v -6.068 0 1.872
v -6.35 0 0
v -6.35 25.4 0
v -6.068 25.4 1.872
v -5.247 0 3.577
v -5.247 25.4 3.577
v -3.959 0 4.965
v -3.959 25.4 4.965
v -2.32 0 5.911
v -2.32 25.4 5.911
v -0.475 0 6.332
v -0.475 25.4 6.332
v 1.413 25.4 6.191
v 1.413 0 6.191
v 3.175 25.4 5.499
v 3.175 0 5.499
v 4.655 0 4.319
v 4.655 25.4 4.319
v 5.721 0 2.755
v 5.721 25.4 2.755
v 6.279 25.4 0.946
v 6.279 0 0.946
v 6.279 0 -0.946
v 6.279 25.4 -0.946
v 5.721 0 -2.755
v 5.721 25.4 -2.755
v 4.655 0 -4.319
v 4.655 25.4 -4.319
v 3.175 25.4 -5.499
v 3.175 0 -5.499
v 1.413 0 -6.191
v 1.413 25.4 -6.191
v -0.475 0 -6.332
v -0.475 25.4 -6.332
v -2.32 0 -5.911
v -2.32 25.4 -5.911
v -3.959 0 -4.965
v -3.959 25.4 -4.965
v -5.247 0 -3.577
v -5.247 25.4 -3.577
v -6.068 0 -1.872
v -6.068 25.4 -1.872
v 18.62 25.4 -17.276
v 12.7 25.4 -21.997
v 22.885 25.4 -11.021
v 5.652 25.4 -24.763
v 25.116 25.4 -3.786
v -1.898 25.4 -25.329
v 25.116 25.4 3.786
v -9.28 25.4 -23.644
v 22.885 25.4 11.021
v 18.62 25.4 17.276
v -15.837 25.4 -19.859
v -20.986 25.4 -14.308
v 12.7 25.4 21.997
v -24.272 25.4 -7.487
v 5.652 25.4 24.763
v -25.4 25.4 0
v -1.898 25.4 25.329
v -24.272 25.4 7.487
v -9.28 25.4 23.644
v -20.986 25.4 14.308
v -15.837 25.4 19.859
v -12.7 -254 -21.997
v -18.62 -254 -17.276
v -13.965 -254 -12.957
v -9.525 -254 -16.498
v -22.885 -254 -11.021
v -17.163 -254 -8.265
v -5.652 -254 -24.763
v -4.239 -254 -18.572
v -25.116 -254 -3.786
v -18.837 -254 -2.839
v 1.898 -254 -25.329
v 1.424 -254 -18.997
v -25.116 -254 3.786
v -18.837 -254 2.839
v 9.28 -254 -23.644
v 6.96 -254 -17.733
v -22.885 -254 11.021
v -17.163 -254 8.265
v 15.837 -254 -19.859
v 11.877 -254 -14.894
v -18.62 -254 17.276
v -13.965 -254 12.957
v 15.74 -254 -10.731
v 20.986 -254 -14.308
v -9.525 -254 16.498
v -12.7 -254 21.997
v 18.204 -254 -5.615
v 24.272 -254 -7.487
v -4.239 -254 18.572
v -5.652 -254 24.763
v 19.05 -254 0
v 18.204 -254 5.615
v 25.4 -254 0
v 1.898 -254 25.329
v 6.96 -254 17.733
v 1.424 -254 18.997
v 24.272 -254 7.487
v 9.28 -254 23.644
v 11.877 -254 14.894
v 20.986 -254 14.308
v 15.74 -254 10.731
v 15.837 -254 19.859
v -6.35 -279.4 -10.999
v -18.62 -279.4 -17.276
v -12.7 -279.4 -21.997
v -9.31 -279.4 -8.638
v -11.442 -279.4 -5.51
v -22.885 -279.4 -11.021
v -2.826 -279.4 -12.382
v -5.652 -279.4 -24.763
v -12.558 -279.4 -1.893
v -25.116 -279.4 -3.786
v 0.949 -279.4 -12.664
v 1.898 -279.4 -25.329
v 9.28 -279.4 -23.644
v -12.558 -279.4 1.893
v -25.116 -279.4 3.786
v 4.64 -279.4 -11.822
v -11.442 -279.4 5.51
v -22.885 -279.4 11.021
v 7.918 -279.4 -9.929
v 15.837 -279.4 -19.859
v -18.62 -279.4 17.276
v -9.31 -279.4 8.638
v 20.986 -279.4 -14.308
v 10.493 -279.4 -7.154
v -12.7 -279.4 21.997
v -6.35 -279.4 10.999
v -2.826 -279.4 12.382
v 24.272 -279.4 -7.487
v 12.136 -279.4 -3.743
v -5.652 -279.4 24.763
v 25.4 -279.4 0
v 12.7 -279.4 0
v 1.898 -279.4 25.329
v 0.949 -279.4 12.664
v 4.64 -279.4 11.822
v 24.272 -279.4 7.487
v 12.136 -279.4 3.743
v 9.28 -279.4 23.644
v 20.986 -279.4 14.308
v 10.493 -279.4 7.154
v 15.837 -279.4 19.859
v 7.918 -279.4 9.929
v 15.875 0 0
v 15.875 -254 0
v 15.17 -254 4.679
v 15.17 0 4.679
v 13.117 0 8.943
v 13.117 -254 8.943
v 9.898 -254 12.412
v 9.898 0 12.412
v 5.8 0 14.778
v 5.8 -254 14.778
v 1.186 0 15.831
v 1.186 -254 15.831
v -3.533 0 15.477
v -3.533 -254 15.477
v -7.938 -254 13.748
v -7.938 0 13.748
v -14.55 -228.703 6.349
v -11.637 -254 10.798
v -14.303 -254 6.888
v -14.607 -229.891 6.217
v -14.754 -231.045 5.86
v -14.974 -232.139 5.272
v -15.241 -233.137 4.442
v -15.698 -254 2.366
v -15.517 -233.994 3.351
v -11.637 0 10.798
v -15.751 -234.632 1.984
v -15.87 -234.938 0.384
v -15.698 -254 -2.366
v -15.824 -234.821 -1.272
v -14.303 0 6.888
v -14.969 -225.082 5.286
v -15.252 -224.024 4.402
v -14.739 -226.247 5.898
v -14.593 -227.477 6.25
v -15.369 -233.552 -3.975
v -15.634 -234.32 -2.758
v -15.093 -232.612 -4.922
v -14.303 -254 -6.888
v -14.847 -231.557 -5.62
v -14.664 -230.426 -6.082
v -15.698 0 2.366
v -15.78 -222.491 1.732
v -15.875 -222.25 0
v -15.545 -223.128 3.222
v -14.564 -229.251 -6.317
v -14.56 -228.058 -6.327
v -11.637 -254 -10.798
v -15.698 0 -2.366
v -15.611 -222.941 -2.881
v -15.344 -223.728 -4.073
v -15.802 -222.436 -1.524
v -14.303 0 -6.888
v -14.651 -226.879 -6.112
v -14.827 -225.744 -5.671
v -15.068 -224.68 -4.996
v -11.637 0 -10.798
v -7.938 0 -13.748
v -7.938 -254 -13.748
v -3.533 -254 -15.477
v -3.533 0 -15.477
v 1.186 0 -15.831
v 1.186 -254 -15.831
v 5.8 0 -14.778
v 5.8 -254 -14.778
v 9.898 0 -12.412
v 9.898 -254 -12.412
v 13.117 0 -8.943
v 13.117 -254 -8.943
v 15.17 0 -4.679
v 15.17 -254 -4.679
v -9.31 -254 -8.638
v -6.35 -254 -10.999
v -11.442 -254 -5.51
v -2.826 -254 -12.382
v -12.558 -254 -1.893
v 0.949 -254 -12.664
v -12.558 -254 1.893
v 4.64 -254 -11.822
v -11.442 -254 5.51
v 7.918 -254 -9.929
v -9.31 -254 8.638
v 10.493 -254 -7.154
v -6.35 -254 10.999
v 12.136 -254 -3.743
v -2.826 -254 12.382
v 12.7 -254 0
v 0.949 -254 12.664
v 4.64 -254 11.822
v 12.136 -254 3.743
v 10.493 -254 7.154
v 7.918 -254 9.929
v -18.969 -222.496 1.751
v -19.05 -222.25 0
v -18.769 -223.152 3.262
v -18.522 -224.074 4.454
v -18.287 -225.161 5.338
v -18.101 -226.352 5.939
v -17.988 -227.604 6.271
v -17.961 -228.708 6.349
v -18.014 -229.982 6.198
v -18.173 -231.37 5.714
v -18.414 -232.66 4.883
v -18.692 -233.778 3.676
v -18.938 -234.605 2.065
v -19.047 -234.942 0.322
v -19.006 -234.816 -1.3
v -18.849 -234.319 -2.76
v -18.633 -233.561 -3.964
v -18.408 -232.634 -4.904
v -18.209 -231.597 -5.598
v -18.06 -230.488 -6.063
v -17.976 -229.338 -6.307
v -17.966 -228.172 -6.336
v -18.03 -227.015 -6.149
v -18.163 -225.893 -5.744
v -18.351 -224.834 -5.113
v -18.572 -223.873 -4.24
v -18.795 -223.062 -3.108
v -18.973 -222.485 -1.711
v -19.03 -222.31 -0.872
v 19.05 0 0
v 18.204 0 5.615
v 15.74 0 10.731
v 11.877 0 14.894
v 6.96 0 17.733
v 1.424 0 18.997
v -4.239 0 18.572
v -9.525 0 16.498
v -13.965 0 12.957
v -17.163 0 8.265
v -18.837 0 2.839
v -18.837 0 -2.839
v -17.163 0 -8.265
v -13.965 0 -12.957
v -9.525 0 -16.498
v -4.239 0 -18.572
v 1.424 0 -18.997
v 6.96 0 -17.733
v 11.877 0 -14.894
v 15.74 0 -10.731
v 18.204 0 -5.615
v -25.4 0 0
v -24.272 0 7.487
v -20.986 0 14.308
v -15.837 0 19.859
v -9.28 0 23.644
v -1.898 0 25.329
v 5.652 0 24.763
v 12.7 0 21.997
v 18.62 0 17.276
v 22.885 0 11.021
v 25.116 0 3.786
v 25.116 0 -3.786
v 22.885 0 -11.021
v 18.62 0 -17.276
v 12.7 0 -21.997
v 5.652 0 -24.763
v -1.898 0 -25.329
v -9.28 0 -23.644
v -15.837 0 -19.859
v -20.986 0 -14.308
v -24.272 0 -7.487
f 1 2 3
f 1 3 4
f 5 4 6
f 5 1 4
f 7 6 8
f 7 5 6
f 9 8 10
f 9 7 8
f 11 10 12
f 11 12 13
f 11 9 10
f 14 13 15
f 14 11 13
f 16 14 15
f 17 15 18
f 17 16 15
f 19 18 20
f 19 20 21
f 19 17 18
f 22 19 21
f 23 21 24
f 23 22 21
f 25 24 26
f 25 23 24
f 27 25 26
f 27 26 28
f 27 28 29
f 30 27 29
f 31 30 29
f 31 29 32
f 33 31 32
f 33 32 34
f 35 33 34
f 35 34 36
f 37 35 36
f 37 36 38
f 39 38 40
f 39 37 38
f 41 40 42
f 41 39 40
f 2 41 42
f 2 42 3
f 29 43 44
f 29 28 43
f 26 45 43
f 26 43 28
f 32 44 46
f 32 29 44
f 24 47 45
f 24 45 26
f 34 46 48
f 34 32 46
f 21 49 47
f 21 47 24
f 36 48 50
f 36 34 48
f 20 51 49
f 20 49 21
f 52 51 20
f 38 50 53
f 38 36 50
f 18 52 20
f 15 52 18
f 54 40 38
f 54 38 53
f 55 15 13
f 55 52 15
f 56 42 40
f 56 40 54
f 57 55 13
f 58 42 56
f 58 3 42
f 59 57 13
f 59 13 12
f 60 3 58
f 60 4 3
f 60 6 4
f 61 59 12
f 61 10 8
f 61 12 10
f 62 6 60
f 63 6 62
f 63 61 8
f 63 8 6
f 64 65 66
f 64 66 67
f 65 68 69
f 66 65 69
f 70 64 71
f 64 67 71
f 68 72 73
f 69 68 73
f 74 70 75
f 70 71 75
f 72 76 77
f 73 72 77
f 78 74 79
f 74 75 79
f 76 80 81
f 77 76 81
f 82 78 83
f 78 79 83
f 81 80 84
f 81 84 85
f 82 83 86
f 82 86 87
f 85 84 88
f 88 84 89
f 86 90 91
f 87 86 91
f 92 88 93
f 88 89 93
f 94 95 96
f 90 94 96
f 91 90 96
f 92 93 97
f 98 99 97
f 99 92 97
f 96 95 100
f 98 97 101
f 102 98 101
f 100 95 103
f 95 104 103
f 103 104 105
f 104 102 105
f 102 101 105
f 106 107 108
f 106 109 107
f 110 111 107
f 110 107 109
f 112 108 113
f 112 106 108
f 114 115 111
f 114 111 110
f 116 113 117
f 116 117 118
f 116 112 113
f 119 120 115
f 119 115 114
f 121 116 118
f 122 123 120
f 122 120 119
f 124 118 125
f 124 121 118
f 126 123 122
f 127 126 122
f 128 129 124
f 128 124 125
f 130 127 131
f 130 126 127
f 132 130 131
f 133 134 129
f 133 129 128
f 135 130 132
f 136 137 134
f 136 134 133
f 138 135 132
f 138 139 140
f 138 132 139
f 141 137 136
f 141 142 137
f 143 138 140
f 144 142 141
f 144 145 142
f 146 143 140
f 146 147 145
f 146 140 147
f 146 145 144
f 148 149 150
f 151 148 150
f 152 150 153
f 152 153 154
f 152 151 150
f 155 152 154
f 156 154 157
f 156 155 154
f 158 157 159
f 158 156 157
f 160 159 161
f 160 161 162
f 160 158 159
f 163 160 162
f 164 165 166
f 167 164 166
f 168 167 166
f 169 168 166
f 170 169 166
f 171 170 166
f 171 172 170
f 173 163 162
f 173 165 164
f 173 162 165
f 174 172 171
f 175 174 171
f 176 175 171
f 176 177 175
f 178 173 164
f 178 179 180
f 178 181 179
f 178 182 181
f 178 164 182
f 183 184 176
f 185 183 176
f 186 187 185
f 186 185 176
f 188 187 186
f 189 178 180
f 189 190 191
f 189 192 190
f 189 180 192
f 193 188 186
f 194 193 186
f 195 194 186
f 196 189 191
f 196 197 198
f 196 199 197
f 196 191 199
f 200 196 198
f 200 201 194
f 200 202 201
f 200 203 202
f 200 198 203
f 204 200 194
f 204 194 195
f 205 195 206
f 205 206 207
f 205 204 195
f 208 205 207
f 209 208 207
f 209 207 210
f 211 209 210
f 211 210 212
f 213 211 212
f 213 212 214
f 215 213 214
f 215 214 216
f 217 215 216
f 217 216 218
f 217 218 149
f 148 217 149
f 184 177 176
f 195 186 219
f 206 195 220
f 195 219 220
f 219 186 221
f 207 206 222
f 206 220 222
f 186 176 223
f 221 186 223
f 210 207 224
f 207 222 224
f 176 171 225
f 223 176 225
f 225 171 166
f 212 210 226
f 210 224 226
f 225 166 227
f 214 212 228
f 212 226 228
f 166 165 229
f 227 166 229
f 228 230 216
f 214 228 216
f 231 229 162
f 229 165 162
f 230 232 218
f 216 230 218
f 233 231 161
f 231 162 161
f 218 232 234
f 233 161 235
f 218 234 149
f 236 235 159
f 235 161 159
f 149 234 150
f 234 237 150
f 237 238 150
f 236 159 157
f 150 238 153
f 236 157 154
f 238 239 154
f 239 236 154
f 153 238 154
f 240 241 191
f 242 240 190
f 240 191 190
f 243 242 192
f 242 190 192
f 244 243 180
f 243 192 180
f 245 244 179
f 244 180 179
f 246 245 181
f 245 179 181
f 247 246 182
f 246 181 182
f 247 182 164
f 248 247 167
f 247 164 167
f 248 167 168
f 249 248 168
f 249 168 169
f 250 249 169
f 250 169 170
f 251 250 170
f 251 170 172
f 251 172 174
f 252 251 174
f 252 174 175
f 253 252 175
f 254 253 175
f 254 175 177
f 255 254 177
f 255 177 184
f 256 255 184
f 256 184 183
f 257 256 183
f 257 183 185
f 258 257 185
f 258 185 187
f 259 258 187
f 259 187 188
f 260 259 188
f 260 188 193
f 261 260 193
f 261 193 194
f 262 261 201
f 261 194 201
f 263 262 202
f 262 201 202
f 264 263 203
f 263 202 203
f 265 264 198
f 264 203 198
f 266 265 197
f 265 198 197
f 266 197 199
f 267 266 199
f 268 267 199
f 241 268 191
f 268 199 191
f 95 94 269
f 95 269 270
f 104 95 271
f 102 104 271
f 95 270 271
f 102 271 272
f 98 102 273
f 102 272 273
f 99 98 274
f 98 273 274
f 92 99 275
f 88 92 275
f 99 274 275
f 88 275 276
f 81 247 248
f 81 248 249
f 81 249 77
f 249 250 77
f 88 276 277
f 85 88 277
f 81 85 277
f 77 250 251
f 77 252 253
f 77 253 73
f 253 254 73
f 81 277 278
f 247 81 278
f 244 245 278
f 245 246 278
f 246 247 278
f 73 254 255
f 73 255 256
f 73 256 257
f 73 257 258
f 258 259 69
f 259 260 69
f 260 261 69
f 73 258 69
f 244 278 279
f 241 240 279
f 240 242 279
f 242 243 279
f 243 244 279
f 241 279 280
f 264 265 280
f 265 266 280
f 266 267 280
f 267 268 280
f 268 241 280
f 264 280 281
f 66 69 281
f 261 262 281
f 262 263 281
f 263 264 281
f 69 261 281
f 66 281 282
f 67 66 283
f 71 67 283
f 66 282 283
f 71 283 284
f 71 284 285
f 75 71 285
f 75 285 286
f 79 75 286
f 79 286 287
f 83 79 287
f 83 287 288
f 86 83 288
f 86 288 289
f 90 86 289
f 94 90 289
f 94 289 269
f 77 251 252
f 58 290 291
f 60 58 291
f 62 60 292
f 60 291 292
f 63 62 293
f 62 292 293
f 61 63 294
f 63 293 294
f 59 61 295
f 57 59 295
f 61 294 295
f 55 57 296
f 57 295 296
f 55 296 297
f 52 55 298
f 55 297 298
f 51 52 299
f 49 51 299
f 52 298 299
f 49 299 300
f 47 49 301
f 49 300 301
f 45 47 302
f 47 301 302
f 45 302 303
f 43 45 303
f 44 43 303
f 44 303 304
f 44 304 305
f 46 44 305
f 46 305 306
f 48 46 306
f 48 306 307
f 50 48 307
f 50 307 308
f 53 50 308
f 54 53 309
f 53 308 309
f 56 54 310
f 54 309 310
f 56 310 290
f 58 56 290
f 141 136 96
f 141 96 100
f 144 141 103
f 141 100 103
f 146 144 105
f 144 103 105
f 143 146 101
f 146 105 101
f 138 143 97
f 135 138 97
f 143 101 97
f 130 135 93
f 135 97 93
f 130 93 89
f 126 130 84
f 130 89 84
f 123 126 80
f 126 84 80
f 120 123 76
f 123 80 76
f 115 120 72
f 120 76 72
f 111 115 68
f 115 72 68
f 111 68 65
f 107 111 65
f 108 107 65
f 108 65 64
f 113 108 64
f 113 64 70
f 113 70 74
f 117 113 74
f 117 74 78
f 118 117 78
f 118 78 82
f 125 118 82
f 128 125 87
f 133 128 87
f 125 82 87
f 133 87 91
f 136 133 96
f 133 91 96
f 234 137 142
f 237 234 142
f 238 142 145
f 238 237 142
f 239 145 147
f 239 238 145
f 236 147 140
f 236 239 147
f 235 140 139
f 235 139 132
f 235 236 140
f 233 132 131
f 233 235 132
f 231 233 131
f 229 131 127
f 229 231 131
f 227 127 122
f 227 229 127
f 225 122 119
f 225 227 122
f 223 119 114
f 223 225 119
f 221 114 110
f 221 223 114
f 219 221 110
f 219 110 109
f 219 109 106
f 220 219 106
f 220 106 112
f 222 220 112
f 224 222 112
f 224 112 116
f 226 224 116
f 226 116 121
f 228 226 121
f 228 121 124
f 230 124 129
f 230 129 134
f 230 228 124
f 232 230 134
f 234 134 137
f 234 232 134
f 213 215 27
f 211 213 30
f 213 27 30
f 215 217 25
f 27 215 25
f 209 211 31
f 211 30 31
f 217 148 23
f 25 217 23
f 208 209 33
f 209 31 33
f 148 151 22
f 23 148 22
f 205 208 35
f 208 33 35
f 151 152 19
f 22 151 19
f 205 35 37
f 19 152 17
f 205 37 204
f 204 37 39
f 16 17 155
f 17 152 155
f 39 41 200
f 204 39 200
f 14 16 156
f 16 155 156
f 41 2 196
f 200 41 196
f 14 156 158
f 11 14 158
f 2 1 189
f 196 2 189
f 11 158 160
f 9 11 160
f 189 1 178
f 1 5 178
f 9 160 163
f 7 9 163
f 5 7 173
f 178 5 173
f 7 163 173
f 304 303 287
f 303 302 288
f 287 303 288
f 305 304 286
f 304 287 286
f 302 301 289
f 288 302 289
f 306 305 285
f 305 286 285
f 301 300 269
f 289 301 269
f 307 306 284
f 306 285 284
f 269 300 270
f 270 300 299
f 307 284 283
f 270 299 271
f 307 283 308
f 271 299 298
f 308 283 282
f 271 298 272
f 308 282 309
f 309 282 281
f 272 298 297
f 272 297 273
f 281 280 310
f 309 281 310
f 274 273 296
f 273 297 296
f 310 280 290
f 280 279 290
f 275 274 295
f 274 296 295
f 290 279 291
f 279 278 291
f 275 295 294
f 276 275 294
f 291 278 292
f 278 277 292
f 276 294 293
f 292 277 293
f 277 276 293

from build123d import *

# Parameters (mm, degrees)
F0_R     = 19.05
F0_R_2   = 15.875
F1_DEPTH = 254
F2_R     = 25.4
F2_R_2   = 6.35
F3_DEPTH = 25.4
F4_R     = 25.4
F4_R_2   = 12.7
F5_DEPTH = 25.4
F7_D     = 12.7
F7_DEPTH = 25.401


with BuildPart() as f1:
    # F0 (on Front) → F1 (new body)
    with BuildSketch(Plane.XZ):
        Circle(F0_R)
        Circle(F0_R_2, mode=Mode.SUBTRACT)
    extrude(amount=F1_DEPTH)

    # F2 (on face) → F3 (join)
    with BuildSketch(Plane(origin=(0, 0, 0), x_dir=(-1, 0, 0), z_dir=(0, 1, 0))):
        Circle(F2_R)
        Circle(F2_R_2, mode=Mode.SUBTRACT)
    extrude(amount=F3_DEPTH)

    # F4 (on face) → F5 (join)
    with BuildSketch(Plane.XZ.offset(254)):
        Circle(F4_R)
        Circle(F4_R_2, mode=Mode.SUBTRACT)
    extrude(amount=F5_DEPTH)

    # F7 (through all, one way)
    with BuildSketch(Plane.YZ):
        with Locations((-228.6, 0)):
            Circle(F7_D / 2)
    extrude(amount=-F7_DEPTH, mode=Mode.SUBTRACT)


solid = f1.part
